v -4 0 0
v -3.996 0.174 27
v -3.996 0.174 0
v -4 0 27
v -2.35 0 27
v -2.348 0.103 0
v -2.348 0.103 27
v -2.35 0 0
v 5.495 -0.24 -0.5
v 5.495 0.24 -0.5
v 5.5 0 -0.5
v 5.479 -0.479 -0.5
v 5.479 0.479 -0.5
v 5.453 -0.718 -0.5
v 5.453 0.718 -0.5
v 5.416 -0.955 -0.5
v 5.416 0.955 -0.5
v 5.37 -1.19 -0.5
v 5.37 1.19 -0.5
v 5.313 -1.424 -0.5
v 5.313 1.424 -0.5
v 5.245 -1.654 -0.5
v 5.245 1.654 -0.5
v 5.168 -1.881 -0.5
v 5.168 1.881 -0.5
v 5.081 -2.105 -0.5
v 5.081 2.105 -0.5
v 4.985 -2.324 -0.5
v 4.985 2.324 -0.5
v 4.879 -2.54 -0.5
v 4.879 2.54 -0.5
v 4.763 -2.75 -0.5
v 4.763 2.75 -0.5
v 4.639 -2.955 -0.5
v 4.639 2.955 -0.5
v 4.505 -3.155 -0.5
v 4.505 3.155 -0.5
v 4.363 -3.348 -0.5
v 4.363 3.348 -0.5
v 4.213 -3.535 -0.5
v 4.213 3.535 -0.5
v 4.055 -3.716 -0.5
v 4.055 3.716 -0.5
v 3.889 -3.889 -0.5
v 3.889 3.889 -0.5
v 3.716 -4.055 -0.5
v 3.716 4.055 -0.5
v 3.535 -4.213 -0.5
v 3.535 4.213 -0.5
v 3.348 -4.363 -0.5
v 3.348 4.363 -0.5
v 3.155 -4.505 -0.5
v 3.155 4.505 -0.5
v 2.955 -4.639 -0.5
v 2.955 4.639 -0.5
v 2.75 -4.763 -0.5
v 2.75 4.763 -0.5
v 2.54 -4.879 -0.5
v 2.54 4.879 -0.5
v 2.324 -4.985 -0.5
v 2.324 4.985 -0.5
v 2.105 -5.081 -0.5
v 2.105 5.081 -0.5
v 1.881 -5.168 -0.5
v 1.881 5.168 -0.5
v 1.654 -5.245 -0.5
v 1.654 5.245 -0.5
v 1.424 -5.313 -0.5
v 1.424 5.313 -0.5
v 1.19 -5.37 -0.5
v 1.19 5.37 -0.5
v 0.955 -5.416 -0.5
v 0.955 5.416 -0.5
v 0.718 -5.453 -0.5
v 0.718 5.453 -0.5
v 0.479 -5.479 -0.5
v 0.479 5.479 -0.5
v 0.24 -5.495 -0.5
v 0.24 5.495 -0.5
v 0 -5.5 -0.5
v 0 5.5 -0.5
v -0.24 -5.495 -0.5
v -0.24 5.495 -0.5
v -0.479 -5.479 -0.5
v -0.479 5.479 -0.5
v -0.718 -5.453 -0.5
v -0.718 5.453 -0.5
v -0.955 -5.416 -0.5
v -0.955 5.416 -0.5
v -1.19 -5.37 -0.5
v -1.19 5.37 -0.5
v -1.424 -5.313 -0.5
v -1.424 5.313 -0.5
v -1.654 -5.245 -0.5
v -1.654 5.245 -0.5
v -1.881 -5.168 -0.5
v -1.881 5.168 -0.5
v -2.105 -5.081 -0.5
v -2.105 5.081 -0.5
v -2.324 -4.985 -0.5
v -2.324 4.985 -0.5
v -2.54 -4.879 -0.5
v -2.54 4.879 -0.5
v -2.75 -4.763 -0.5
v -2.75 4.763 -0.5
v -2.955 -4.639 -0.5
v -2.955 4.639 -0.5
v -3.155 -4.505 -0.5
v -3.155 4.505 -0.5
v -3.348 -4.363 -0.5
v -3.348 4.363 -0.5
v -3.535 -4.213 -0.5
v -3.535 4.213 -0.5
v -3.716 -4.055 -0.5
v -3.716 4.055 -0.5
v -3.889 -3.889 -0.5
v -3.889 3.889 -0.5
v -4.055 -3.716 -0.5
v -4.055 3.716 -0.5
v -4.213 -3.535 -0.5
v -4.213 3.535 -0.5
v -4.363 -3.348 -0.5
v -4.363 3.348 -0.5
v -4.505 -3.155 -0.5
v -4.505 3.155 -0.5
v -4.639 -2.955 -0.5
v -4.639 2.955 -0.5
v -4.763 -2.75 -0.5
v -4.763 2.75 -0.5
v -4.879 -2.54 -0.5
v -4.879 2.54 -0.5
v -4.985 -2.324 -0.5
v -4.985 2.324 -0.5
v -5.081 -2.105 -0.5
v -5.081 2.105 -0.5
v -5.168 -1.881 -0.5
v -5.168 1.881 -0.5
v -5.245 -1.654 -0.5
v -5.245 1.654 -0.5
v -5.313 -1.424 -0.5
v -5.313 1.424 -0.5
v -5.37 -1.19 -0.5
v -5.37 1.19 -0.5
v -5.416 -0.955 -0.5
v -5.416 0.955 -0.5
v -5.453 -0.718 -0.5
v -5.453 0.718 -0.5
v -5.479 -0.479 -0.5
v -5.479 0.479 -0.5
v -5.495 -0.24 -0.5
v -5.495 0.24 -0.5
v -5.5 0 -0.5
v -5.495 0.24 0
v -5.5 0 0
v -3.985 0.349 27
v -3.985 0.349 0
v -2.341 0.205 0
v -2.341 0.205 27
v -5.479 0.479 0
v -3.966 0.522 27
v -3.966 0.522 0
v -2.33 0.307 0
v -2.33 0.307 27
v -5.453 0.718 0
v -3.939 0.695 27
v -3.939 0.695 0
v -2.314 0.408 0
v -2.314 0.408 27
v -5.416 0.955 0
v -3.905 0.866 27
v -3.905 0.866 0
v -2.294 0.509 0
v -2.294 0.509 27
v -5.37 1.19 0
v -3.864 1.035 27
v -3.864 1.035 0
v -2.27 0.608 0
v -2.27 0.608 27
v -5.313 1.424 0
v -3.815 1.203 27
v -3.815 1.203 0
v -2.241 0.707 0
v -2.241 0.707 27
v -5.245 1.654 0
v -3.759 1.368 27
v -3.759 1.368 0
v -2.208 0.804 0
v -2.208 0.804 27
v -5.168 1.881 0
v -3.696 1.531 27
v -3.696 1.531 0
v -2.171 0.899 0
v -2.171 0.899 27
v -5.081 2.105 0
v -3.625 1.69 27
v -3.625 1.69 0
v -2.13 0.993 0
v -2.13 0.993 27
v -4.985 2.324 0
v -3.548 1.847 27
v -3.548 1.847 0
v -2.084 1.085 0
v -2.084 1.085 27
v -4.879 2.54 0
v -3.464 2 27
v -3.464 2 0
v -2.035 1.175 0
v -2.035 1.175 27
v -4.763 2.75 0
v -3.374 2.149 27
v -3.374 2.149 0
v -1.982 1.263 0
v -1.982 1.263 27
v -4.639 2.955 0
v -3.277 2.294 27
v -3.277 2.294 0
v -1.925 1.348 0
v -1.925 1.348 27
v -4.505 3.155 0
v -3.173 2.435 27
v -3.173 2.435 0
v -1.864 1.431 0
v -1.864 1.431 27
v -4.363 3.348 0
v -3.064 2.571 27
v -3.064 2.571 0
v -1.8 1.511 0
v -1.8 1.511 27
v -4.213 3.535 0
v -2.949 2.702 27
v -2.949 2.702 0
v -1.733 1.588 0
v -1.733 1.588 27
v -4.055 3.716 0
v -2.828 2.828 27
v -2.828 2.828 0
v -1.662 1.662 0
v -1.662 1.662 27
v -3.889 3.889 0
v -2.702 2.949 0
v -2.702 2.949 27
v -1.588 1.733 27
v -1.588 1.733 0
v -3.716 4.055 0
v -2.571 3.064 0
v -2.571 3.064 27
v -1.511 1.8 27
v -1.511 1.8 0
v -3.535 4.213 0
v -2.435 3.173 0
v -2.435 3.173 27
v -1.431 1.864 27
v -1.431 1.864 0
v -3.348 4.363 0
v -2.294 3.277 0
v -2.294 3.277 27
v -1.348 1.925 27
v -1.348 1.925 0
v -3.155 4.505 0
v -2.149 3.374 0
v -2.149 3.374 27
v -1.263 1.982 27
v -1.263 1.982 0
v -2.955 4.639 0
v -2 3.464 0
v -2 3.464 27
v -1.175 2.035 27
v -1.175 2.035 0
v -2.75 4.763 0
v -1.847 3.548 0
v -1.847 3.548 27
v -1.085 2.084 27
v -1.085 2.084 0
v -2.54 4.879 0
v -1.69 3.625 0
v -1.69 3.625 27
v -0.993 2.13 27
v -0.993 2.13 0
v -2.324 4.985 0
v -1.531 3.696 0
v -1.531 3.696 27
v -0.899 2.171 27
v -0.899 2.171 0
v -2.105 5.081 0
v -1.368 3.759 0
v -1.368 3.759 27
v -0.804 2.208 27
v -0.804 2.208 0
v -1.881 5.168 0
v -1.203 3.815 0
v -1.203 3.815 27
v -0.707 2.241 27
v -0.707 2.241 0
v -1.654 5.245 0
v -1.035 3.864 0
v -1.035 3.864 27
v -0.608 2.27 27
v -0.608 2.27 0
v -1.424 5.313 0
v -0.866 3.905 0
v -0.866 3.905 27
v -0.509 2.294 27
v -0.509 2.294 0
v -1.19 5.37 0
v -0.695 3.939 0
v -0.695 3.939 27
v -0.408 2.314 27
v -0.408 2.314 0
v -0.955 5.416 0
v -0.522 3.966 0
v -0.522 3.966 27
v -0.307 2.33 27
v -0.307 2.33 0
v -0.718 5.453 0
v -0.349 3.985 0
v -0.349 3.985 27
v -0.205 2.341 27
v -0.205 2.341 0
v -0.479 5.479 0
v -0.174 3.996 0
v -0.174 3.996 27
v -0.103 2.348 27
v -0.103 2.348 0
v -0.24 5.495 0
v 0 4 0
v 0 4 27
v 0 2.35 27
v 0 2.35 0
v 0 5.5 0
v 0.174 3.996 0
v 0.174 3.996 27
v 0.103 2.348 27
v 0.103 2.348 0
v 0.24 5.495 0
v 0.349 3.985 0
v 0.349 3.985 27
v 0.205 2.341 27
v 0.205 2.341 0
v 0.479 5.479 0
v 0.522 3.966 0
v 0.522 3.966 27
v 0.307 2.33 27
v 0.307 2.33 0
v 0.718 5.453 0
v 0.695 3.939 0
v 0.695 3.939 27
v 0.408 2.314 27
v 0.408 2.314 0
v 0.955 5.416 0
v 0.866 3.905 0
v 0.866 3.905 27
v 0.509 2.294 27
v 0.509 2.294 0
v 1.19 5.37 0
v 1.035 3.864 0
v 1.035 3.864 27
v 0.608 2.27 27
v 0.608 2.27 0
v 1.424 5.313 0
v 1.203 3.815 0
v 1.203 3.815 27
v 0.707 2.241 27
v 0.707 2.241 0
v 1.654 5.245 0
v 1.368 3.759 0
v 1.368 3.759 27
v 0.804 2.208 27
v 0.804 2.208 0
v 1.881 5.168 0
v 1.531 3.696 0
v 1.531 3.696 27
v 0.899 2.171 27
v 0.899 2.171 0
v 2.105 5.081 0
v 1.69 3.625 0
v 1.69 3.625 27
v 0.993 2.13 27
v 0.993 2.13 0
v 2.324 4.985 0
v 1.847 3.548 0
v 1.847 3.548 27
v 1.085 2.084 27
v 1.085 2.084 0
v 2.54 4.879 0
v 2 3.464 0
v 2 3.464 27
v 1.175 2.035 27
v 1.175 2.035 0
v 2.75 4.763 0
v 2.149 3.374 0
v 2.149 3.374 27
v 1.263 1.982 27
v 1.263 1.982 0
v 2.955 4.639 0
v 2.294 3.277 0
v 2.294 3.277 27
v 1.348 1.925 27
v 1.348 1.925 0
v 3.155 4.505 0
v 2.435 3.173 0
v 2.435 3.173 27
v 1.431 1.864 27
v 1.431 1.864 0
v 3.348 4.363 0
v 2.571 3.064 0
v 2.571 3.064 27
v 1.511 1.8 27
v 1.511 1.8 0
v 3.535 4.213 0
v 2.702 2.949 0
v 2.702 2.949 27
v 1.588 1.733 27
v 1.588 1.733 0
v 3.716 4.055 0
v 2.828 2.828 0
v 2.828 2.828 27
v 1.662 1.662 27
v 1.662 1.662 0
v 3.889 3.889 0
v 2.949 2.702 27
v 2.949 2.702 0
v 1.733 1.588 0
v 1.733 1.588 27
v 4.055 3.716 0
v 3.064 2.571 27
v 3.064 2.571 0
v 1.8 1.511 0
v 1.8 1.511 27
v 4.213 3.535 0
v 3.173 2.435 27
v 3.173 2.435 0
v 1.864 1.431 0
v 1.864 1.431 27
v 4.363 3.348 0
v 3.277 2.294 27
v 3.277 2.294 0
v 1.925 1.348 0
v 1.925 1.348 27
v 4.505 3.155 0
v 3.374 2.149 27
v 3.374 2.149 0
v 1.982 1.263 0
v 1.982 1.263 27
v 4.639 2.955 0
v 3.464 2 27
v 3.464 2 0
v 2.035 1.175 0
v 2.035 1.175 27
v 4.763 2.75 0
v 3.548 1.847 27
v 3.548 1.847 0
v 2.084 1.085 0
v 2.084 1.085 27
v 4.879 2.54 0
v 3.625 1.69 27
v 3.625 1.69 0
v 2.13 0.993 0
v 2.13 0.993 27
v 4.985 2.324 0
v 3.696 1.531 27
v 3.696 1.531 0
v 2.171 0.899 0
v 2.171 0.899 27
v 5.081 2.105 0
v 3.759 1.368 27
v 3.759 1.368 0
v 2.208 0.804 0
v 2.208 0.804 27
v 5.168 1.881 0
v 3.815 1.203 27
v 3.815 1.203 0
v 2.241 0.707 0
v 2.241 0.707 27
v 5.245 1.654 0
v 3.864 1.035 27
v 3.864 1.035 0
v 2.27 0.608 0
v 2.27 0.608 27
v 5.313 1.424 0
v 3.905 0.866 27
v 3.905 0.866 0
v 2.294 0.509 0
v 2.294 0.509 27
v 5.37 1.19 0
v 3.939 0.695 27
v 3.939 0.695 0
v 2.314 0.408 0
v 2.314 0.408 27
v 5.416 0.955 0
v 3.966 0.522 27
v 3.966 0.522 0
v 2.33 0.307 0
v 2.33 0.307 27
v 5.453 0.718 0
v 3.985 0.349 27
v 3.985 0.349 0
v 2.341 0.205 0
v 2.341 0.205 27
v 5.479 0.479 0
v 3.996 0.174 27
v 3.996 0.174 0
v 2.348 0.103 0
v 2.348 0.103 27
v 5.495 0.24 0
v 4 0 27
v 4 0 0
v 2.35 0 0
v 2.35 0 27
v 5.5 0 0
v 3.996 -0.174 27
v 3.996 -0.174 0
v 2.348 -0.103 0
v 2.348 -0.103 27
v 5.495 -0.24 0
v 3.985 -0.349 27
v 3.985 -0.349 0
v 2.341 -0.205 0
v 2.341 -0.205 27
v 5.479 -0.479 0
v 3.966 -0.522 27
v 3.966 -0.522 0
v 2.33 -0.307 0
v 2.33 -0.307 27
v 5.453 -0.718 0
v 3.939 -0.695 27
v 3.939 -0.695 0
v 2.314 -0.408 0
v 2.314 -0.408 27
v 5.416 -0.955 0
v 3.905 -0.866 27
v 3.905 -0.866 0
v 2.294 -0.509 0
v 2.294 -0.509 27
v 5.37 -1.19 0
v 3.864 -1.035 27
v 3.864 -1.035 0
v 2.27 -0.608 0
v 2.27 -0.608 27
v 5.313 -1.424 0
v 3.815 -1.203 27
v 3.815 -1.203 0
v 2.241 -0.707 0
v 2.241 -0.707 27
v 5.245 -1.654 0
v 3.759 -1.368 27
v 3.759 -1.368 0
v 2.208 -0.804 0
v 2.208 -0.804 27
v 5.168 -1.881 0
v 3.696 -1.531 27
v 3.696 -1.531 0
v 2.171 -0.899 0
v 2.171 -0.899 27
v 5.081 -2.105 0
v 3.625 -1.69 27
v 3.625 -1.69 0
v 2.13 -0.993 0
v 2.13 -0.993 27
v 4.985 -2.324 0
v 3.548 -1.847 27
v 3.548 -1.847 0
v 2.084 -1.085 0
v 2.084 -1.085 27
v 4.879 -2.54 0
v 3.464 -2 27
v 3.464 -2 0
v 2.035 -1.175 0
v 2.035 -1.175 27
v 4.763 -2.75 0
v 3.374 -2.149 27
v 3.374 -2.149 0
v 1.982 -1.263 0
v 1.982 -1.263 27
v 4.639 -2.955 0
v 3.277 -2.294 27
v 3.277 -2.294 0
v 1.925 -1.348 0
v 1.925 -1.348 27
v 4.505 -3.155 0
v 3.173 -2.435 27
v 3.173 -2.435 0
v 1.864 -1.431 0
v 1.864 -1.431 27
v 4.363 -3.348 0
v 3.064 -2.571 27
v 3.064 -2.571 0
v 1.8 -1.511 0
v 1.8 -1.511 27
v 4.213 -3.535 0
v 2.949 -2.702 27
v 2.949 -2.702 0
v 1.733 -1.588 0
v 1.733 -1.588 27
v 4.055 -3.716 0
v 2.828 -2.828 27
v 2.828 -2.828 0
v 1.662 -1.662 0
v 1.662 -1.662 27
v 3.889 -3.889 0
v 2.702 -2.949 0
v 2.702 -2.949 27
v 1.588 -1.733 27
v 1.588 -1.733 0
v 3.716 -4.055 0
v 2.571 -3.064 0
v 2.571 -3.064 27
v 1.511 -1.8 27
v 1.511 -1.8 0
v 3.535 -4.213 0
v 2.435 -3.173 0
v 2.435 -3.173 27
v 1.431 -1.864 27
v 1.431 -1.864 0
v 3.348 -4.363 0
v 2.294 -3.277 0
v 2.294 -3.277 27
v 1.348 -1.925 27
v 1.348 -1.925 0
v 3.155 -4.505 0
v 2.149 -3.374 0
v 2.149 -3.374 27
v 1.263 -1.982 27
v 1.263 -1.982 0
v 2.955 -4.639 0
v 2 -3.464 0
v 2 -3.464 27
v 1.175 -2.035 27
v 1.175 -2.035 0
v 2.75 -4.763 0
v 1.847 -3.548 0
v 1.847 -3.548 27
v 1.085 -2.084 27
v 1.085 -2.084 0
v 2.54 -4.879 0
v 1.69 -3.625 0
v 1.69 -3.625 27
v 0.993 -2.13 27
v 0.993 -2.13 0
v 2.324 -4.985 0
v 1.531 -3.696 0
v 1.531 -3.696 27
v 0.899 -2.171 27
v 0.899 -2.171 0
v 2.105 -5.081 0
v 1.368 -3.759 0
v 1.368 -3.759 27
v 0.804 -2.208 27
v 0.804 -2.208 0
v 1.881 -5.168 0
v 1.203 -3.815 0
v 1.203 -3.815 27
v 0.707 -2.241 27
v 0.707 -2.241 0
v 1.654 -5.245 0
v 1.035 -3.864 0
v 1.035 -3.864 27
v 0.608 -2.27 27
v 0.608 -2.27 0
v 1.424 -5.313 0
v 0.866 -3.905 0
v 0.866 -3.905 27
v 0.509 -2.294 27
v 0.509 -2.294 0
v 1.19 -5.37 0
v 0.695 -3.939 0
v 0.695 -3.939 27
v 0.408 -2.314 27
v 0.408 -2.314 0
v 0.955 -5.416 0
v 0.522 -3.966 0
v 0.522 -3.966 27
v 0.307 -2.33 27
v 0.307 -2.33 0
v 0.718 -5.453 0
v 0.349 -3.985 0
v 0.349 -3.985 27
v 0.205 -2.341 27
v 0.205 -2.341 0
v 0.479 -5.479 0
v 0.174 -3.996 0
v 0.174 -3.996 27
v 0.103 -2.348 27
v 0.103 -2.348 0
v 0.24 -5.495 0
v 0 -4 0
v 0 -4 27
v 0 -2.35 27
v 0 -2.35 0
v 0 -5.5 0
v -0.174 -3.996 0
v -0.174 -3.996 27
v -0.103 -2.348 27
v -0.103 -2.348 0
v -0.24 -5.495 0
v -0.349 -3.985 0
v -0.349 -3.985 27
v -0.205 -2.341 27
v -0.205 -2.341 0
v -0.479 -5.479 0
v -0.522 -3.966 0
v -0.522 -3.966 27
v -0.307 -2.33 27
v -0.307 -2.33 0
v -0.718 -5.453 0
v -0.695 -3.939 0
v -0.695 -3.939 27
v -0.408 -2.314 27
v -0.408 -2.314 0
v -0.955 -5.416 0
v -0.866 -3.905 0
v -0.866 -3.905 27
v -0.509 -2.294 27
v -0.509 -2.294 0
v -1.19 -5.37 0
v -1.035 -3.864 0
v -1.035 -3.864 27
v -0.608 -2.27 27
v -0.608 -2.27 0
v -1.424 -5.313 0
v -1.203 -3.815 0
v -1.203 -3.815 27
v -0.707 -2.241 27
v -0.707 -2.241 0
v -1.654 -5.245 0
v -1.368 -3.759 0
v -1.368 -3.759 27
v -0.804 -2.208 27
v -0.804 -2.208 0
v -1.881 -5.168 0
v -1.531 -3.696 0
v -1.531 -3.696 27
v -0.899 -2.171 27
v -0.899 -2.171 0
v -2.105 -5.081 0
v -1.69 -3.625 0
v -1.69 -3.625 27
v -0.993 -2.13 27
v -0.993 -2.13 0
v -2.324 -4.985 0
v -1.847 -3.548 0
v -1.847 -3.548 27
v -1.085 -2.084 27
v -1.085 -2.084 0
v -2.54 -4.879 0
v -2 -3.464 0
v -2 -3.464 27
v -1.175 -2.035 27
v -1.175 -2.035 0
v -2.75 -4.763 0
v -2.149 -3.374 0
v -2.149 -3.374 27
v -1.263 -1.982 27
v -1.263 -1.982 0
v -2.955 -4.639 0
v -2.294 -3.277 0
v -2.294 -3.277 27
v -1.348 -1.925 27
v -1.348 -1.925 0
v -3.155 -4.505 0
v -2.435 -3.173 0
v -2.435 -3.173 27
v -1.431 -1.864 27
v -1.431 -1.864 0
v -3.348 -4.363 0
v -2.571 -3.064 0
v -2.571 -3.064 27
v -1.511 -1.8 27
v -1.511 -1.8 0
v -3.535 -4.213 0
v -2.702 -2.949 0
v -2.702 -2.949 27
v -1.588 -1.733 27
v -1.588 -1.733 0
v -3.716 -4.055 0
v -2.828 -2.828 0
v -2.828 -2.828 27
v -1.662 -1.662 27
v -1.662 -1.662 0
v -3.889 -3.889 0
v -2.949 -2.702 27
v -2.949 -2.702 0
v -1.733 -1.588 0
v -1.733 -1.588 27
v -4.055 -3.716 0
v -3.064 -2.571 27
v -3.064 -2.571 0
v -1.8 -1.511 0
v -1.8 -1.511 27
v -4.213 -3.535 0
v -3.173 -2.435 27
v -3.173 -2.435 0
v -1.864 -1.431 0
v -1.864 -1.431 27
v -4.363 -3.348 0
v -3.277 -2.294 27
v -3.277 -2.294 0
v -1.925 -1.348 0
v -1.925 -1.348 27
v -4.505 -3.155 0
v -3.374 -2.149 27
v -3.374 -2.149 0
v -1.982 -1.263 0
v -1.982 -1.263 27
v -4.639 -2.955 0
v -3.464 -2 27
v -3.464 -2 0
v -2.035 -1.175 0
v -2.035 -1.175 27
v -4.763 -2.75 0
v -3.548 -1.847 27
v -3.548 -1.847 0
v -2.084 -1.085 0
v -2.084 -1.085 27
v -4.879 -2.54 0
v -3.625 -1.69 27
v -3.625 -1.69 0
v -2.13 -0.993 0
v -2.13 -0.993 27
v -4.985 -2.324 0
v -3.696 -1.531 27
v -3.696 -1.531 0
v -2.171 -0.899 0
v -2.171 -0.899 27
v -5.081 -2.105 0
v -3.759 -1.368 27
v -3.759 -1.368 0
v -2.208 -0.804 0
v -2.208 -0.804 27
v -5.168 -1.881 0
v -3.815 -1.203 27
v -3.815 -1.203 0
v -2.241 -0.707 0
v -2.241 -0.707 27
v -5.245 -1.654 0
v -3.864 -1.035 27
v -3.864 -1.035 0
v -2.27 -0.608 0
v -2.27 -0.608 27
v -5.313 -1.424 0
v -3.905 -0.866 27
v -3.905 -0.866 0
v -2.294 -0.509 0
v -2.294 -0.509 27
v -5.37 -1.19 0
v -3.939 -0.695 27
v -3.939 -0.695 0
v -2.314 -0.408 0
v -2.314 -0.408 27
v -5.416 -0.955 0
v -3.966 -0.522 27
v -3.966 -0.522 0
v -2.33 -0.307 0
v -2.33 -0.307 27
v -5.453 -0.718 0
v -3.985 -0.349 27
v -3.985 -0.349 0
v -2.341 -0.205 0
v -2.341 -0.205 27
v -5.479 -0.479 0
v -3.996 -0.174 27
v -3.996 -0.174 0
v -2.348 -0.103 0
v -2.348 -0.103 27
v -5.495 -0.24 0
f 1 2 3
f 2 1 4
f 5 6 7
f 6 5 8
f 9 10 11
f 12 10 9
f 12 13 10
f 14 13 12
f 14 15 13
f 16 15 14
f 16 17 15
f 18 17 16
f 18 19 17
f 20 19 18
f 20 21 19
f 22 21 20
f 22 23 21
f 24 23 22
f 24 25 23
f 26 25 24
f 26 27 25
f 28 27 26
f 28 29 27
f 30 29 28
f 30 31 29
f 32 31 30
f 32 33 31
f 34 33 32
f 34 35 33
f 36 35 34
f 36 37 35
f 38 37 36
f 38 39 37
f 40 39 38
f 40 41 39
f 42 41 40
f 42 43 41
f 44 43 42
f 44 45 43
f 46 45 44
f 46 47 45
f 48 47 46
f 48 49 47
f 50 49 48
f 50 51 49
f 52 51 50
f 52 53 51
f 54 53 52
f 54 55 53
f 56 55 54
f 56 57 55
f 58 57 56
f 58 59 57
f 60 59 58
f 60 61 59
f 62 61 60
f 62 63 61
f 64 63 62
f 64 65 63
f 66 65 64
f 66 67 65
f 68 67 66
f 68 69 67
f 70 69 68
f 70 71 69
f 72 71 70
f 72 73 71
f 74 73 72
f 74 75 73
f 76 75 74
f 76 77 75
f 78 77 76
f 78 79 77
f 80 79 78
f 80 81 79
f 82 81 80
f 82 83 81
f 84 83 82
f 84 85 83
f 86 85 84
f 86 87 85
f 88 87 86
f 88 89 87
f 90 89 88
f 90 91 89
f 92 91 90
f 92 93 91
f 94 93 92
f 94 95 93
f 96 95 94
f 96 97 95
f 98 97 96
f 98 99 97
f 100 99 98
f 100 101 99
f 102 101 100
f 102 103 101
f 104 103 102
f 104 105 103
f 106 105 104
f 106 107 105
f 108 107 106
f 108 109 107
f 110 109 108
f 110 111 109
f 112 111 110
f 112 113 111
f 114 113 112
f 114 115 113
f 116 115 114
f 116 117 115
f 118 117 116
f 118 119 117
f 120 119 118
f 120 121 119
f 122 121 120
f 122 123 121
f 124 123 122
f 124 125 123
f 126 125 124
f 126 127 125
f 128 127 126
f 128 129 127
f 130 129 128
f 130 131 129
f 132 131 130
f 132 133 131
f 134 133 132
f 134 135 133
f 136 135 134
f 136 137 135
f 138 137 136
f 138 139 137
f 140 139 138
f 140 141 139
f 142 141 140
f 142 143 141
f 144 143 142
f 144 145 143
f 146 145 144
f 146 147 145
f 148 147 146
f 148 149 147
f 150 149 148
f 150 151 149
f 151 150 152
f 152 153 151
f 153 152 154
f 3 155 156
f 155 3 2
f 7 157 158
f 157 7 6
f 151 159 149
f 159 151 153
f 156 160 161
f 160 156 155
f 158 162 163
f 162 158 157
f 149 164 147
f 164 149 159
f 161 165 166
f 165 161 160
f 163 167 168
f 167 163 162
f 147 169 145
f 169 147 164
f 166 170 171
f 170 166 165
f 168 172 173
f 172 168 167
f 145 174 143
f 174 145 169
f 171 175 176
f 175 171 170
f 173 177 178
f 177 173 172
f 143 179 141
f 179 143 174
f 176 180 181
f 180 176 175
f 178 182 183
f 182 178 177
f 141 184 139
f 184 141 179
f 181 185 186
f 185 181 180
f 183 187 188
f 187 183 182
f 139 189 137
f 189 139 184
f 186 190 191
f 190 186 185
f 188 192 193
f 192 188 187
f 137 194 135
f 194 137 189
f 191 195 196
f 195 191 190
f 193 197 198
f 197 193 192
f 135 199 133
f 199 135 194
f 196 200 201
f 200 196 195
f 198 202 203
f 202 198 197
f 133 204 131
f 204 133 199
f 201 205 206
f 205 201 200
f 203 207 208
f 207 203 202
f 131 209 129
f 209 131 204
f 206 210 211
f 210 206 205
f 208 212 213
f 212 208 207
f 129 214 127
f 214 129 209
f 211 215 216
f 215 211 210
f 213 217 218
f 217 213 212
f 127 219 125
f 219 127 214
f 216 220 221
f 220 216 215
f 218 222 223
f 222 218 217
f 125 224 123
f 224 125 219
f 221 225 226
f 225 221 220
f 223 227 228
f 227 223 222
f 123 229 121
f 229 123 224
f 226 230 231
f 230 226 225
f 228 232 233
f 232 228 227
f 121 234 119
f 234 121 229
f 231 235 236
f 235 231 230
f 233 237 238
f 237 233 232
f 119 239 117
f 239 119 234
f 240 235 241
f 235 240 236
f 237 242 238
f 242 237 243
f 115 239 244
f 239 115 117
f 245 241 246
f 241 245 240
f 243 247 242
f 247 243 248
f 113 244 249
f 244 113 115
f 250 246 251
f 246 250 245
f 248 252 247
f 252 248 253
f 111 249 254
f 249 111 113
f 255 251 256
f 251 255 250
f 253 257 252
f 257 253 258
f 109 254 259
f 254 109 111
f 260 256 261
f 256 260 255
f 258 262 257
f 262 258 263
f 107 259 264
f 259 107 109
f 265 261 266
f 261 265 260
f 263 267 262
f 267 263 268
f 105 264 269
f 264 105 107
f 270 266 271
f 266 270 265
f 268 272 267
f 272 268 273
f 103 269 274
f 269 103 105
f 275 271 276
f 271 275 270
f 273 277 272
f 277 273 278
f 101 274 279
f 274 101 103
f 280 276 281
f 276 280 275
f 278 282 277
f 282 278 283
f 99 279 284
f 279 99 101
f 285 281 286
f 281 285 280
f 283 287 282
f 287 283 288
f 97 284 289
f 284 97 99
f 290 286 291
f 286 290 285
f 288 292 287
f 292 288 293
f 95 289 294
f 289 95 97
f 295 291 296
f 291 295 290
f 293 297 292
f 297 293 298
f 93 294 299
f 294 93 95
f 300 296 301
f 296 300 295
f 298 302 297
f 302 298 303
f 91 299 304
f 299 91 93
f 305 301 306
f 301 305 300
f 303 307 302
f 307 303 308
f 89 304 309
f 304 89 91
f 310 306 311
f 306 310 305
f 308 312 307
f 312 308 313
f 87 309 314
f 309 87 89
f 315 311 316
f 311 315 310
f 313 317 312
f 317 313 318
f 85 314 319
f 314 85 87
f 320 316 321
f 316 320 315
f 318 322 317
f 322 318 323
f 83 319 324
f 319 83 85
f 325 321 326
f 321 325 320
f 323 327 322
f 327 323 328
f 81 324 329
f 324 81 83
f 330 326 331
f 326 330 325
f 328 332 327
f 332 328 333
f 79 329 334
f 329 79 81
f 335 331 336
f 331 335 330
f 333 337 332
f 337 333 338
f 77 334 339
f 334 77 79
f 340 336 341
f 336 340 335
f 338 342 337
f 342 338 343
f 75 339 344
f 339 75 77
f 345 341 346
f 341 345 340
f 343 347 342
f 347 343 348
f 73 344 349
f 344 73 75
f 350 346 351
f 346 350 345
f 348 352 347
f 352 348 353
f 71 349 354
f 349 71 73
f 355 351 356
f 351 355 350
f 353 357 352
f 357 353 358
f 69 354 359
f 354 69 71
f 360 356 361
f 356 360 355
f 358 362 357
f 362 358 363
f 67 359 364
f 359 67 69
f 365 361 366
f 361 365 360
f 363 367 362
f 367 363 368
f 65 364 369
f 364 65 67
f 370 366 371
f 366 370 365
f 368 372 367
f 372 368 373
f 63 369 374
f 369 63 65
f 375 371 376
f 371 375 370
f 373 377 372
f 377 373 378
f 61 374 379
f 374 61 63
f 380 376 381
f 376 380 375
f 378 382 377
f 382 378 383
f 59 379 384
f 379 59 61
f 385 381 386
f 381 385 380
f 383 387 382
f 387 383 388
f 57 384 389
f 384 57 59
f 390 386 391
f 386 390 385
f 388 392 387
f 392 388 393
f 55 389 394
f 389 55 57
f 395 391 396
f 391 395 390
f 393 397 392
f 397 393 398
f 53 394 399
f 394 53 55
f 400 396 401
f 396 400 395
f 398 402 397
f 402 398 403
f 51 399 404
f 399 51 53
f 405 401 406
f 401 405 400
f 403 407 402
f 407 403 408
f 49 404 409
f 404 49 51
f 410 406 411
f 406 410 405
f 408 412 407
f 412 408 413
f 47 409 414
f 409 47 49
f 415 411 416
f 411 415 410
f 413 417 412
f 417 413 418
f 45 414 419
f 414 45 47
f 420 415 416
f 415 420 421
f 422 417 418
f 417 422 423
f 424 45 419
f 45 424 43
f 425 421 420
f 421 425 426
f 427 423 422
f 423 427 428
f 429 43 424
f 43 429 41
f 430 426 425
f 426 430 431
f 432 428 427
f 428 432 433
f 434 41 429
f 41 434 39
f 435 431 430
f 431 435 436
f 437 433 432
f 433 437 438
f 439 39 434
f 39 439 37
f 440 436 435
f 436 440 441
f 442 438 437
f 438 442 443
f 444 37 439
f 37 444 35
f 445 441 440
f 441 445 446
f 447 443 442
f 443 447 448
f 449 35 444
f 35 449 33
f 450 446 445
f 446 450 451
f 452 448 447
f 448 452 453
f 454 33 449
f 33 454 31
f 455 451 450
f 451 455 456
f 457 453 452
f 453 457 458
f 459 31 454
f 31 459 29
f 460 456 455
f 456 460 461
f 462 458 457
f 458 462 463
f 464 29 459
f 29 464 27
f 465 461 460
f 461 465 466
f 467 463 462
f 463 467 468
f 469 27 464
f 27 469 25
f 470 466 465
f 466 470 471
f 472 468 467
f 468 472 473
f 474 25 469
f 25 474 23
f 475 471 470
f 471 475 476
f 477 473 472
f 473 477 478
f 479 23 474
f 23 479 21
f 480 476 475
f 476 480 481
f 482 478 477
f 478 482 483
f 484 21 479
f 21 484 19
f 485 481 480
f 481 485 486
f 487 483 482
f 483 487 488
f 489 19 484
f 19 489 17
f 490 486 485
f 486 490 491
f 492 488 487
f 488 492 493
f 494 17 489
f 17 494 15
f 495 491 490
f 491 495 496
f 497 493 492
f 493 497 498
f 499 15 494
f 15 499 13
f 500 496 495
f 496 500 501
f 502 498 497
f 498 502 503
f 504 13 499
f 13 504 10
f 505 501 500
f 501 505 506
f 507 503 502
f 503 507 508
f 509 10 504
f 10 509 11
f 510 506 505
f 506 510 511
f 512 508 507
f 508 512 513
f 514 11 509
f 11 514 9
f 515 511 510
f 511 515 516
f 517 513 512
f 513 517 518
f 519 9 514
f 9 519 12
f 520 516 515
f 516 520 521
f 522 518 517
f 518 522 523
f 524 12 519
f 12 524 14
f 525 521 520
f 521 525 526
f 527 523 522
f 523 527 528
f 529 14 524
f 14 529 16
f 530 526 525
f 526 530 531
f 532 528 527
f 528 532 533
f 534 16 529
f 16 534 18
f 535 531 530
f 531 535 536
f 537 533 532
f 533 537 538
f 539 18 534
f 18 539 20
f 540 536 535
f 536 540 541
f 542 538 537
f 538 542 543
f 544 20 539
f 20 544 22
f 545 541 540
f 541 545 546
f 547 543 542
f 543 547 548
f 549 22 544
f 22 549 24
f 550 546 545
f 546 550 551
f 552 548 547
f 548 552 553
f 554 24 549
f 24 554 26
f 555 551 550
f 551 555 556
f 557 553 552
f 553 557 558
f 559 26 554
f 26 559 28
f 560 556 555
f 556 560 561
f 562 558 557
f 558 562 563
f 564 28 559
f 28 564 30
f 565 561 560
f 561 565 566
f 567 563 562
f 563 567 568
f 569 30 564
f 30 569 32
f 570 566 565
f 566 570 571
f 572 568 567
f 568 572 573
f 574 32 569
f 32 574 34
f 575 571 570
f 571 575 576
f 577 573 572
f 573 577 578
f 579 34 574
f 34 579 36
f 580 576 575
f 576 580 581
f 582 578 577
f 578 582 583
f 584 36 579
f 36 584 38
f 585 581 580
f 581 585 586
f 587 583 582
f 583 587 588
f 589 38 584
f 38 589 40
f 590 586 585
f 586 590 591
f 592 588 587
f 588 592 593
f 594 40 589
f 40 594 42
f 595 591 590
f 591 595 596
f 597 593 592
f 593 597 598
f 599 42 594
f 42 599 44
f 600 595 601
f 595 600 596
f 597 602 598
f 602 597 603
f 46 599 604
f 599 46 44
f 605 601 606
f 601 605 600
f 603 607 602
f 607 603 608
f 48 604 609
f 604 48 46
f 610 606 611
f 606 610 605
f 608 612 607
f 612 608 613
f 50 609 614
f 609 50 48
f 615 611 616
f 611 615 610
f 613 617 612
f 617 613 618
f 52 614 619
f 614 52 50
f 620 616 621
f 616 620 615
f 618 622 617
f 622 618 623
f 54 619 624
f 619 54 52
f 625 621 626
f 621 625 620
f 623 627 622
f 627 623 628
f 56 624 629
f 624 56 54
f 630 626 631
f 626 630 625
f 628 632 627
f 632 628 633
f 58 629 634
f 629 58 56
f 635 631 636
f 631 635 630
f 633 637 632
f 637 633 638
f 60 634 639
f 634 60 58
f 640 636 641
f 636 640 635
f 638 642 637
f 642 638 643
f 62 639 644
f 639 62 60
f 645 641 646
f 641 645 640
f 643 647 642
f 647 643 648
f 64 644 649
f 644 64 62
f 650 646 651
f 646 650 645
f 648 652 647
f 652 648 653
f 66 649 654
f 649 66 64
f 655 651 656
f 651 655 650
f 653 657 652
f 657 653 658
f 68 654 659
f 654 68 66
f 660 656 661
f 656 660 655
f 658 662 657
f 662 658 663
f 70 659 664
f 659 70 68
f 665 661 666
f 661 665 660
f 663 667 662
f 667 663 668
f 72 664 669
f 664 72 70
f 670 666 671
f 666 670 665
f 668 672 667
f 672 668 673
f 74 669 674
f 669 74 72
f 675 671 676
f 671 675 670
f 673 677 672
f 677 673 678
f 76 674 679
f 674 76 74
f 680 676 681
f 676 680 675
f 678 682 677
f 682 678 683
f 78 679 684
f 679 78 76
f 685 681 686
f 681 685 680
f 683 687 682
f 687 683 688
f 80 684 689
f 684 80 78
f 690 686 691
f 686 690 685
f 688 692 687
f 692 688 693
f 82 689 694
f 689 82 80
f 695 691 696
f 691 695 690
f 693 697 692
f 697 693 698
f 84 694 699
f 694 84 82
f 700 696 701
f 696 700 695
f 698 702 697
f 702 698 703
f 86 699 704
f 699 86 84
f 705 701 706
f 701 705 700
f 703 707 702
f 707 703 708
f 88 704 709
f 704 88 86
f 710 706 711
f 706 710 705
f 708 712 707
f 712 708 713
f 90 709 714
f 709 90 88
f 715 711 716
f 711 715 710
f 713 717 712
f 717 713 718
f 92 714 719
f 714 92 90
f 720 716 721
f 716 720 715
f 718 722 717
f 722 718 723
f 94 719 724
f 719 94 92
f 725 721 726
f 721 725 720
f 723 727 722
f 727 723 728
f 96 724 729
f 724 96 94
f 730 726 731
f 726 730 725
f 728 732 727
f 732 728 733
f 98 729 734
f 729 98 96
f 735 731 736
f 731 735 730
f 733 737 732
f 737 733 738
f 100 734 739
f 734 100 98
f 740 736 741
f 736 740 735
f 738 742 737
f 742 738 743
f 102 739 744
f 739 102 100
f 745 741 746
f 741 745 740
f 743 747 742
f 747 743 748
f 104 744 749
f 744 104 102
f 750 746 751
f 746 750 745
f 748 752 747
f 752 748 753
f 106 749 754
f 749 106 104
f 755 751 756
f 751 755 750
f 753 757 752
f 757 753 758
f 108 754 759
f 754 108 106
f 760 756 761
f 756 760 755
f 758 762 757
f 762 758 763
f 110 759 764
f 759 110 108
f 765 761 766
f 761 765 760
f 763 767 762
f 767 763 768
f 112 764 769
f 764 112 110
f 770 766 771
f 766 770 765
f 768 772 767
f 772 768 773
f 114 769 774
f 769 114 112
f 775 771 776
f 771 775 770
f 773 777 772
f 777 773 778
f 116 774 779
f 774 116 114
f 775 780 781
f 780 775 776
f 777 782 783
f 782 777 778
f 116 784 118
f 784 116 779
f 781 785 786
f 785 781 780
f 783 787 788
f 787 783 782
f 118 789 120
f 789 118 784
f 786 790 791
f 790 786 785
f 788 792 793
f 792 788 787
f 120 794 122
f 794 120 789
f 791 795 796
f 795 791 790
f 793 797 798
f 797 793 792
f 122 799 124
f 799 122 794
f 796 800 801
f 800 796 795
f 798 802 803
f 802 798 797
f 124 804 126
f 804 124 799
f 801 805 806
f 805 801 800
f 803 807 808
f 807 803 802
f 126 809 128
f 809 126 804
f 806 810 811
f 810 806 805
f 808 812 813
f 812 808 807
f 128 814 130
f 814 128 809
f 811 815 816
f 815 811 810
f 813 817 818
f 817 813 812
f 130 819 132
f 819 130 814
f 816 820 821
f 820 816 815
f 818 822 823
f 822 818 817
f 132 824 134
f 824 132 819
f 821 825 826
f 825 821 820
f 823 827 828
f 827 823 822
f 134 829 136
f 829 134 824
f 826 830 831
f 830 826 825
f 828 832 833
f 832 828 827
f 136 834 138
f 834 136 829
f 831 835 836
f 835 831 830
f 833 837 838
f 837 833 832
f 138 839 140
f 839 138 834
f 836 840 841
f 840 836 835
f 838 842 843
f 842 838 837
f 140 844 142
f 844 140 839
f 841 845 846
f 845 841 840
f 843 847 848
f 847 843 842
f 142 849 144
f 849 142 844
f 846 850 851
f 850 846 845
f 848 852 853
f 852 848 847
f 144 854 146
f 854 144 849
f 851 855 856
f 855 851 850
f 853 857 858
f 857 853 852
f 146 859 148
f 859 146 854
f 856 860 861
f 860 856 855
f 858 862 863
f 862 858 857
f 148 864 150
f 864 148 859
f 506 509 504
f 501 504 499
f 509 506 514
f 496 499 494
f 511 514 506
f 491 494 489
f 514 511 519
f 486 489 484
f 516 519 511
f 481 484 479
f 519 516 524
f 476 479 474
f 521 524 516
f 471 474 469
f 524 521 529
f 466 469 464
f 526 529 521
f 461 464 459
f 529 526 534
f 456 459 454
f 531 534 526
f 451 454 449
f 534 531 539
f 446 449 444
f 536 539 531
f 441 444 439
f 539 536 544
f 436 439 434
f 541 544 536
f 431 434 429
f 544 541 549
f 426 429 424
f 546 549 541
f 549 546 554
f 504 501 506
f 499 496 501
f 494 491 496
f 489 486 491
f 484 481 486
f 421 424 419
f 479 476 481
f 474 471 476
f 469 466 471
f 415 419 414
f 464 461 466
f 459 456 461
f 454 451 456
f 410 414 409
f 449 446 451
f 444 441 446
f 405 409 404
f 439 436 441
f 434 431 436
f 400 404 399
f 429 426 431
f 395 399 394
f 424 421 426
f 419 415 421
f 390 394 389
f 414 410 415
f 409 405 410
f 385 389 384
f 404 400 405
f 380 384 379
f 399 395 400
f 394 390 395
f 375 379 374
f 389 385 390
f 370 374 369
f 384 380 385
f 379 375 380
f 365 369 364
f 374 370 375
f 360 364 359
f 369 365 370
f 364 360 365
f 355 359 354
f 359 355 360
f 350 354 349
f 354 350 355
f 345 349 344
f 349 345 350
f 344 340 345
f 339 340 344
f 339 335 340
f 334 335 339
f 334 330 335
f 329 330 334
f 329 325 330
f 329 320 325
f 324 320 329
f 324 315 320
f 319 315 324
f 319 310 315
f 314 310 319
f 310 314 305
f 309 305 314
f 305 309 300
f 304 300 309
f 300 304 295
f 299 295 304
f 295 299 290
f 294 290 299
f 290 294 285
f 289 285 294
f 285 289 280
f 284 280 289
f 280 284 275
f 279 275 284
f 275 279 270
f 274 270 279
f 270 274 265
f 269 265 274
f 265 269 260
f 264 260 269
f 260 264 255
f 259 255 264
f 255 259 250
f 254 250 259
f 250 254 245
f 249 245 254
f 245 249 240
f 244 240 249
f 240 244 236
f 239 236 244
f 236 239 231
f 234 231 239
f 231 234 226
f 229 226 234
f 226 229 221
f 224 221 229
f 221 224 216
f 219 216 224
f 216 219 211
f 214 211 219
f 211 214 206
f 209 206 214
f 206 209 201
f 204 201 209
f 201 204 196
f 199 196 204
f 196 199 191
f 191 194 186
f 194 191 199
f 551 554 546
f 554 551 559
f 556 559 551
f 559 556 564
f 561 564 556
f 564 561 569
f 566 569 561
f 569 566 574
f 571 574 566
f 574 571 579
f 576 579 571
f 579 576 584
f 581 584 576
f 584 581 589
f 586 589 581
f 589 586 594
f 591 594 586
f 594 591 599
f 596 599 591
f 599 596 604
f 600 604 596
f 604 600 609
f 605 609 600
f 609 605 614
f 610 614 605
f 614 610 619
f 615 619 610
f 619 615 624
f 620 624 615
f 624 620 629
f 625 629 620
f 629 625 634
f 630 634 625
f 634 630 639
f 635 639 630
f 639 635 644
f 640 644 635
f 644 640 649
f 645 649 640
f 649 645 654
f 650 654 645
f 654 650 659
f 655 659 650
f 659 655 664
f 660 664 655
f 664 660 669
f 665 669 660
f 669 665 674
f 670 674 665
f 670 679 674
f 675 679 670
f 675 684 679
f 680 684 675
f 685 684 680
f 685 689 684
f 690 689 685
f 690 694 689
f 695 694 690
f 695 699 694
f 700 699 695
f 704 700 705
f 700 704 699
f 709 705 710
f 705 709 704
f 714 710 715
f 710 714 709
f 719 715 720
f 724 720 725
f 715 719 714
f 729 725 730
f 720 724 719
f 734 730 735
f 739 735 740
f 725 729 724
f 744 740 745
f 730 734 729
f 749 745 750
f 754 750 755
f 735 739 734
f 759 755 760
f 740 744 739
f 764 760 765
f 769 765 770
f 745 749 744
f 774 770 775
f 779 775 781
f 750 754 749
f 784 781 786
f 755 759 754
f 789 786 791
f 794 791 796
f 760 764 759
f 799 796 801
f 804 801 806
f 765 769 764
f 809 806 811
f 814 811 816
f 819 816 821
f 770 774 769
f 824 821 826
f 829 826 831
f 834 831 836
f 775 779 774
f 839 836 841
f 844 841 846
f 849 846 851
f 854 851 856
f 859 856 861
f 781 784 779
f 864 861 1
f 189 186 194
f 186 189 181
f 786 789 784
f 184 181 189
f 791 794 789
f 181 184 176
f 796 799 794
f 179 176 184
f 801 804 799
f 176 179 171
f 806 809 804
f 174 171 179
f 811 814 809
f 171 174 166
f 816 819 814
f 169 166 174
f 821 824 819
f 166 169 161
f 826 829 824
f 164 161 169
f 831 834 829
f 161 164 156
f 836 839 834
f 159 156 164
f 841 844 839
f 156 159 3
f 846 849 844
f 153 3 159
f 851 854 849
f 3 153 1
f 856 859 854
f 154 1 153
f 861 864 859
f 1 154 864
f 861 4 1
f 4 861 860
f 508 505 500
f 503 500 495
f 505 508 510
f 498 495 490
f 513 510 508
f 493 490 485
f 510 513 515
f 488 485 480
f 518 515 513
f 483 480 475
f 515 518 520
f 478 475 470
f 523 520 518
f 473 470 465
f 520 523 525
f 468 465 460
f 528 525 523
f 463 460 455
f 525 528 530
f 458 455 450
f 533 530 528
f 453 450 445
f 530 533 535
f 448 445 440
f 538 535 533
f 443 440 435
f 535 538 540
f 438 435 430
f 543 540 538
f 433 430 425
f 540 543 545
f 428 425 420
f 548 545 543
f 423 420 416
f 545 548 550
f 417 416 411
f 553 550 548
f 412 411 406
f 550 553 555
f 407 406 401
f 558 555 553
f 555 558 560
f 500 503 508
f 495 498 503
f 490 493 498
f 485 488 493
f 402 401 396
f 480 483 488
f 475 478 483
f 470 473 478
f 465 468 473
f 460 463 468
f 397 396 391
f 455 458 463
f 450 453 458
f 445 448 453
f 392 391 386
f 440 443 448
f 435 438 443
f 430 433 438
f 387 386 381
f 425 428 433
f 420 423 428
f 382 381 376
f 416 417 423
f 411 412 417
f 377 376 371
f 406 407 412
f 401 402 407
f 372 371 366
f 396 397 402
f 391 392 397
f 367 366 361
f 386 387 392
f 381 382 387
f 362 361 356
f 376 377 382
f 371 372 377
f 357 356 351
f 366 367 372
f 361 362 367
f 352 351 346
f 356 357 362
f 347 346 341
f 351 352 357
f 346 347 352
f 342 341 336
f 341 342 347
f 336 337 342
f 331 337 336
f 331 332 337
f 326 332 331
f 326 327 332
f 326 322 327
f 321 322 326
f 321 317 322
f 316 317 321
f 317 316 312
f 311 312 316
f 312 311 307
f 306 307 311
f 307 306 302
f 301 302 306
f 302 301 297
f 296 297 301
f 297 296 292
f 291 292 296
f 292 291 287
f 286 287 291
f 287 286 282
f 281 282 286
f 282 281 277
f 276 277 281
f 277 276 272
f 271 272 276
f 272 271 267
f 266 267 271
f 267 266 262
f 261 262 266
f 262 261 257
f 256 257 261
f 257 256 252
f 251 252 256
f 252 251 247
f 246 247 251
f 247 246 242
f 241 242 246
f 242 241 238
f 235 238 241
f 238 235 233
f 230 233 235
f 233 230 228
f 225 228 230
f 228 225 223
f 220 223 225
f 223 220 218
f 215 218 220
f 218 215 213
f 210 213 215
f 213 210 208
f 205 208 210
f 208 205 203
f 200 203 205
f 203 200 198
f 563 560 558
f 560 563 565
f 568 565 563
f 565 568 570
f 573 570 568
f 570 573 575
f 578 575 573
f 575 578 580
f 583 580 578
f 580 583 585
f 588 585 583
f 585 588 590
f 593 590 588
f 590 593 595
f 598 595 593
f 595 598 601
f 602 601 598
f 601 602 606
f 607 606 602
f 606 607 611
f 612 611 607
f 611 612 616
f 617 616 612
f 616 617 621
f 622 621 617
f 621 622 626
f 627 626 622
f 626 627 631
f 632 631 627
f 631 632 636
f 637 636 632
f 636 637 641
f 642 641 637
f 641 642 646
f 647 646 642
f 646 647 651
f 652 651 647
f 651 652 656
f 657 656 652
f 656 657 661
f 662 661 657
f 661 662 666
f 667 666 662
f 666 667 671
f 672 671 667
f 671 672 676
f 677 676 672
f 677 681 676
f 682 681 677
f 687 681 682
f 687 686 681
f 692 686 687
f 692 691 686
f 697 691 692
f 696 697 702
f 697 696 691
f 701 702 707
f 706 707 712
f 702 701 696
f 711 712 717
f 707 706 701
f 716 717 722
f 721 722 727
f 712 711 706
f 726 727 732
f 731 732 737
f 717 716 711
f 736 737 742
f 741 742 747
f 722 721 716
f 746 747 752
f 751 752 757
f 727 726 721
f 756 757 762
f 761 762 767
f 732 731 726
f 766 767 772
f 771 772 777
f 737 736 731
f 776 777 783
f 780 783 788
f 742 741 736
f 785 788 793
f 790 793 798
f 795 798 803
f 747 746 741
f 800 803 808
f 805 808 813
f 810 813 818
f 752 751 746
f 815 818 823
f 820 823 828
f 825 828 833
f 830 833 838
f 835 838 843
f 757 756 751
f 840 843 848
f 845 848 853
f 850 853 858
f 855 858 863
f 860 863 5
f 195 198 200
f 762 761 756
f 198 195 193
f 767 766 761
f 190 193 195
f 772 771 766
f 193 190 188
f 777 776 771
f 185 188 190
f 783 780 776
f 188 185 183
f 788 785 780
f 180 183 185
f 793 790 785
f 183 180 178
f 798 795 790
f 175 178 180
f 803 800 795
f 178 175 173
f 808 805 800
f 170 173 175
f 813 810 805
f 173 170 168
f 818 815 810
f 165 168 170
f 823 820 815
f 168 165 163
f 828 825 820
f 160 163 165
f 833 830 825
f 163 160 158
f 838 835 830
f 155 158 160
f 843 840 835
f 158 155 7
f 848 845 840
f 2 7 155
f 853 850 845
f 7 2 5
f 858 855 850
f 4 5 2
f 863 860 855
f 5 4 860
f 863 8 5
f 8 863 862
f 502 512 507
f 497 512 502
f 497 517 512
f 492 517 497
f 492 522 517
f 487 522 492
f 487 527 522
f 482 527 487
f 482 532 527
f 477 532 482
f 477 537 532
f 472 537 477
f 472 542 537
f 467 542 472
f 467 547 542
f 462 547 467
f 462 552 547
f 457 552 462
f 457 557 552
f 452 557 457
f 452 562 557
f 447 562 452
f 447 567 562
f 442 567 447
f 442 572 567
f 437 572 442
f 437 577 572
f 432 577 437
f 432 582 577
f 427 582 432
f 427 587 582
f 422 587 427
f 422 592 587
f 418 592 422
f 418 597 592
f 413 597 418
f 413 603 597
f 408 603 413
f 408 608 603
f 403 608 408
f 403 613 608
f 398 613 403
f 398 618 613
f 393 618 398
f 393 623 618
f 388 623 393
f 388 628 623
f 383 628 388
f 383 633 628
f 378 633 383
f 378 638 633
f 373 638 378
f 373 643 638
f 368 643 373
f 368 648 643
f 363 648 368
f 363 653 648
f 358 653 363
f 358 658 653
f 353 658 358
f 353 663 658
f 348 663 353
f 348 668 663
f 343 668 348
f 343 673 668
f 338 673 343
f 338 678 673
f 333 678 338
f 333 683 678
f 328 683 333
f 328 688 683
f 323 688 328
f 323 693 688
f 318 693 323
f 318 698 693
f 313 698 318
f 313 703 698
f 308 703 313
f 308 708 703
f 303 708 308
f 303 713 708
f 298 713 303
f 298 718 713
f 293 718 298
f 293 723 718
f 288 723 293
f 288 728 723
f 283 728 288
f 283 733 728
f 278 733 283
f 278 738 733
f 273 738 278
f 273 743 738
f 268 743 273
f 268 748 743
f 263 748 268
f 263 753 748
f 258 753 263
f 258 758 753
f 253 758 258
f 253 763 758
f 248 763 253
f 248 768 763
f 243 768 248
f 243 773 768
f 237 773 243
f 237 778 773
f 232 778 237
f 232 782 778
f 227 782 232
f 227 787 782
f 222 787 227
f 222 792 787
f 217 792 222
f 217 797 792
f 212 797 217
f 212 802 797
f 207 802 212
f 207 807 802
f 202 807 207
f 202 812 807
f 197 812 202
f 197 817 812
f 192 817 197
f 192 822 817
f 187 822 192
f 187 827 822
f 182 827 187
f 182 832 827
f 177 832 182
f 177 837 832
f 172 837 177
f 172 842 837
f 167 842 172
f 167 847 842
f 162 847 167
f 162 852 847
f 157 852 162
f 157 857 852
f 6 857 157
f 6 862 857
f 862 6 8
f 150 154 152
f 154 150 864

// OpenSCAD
// file: ../print_fit.scad
// Print-fit clearances, shared by every printed part's `config="revised"`.
//
// A printed part comes off the machine slightly oversize, so a feature drawn
// line-to-line against what it mates with will not go together. Each mating
// feature is drawn at its mate's nominal size plus or minus one of two
// clearances, per side, chosen by what the mate is:
//
//     FIT_PRESS    a bought part the printed one is seated on, located by
//                  or bonded to: bearings, motors, splines, CF rods, tubes
//                  and strakes
//     FIT_SLIP     another printed part, and every fastener's clearance:
//                  screw holes, nut traps and pockets
//
// A third class is not a fit, because its surfaces never meet:
//
//     FIT_RUN      a gap between two parts that turn past each other and
//                  must never touch, such as a housing and a gear's teeth
//
// A fourth class is drawn under its mate's size, not over it:
//
//     FIT_TAP      a pilot a screw cuts its own thread into, drawn as
//                  fit_pin(the screw's nominal, FIT_TAP)
//
// The classes, their members and exclusions, and how a machine is qualified
// against these values are owned by specs/007.2 § Print fits; the coupon that
// qualifies them is 950-Tooling/fit_coupon.scad.
//
// Every part `include`s this file, so `-D FIT_SLIP=...` reaches a single
// render, and an edit here retunes every part. `config="previous"` draws at
// zero clearance: it is the reference mesh, and its dist gate measures it.

FIT_SLIP  = 0.15;
FIT_PRESS = 0.05;
FIT_RUN   = 0.50;
FIT_TAP   = 0.20;

// A hole or bore that takes a mate of diameter d, and a pin or shaft that
// goes into one, with clearance c per side.
function fit_bore(d, c) = d + 2 * c;
function fit_pin(d, c) = d - 2 * c;

// The clearances a part draws in configuration cfg: [slip, press, run, tap].
function fit_clearances(cfg) =
    cfg == "previous" ? [0, 0, 0, 0] : [FIT_SLIP, FIT_PRESS, FIT_RUN, FIT_TAP];
// file: belt_director.scad
// The Belt Director: a shouldered sleeve, shared by the two lengths of it, and the cap that presses in
// behind it.
//
//     210-004_SmallBeltDirector.scad   S1 17.000 long, revised 16.700
//     210-005_LargeBeltDirector.scad   S1 27.000 long, revised 26.000
//     210-001_BeltDirectorCap.scad     the cap, for either
//
// Two MR128s press onto S1, whose Ø8.000 is their bore, so their Ø12 outer races carry the belt; the
// directors push through the Arm Body's lug columns front to back and a cap presses in behind
// (specs/008.5 step 7). Measured from both references with scadmesh profile/slice/radial; they agree
// to 0.002, and their only difference is S1's length. The feature IDs are those of each part's
// .view.json:
//
//     ID  feature   value                       z span
//     H1  head      Ø11.000, solid              -0.500 .. 0
//     S1  shank     Ø8.000                      0 .. length
//     B1  core      Ø4.700, blind to H1         0 .. length
//
// The z rows a histogram reports along S1 (5.667, 11.333 on the Small; 5.4, 6.75, ... on the Large)
// are tessellation rows, not faces. FRAME: the axis on +Z through the origin, H1's top at z = 0.
//
// THE DISCS. The head bears on the bearing at the front and the cap's disc on the one at the back, and a
// disc that reaches the outer race brakes the bearing it locates, since the outer race is the one that
// turns with the belt. `revised` therefore draws both discs at DISC_D, one diameter, between S1's Ø8 and
// the Ø10 halfway line across the MR128's section (700-Differential/diff_params.scad, shoulder_bore), so
// each touches the inner race alone and clears the outer race, DISC_T thick for strength, with the outer
// face's edge rounded DISC_FILLET to be comfortable to handle. The bearing-side edge stays sharp: a round
// there would take the flat the inner race bears on. `previous` keeps the reference head's Ø11 x 0.5.
//
// THE CAP. A solid plug of the core's bore at the press clearance (print_fit.scad), CAP_PLUG long, under a
// disc of the head's size. FRAME: the disc's underside at z = 0, the plug below it. The cap's disc sits on
// the inner race of the bearing behind the shank: `revised` S1 is the span between a column's outer bearings
// (the Arm Body draws B and C 16.7 apart, A 26.0), so it ends flush with the bearing behind it and the disc bears
// on the race and the shank both. S1's `previous` length is the reference's.
//
// FITS (print_fit.scad), revised only: S1 on the MR128's Ø8 bore at the press clearance, and the cap's plug
// in B1 at the press clearance too: both are printed, which is the slip class, but the plug is a press fit by
// design, and a slip gap would let it fall out. S1 in the Arm Body's Ø9 holes is settled there.
//
// Used, not included: each part file calls belt_director(length) or belt_director_cap(), and the Idler
// Plug solid_revolve().

include <../print_fit.scad>

BELT_DIRECTOR_HEAD  = [5.500, 0.500];   // previous: radius, thickness
BELT_DIRECTOR_SHANK = 4.000;            // radius
BELT_DIRECTOR_CORE  = 2.350;            // radius
DISC_D              = 9.500;            // revised: both discs
DISC_T              = 2.000;            // revised: both discs' thickness
DISC_FILLET         = 1.000;            // revised: the round on each disc's outer edge
CAP_PLUG            = 5.000;            // the plug's length: past the bearing's 3.5

// The quarter circle of radius r about c, from angle a0 to a1.
function quarter(c, r, a0, a1, n = 12) = [for (i = [0 : n]) c + r * [cos(a0 + (a1 - a0) * i / n), sin(a0 + (a1 - a0) * i / n)]];

// The solid of revolution of an [r, z] profile with an edge on the axis, clipped to a box 1 mm clear of
// it so that the export carries no zero-area facets along the axis (README.md, "A revolve with an edge
// on the axis"). The Idler Plug uses it too.
module solid_revolve(profile)
    let(r = max([for (p = profile) p.x]) + 1, z0 = min([for (p = profile) p.y]) - 1, z1 = max([for (p = profile) p.y]) + 1)
    intersection() {
        rotate_extrude() polygon(profile);
        translate([-r, -r, z0]) cube([2 * r, 2 * r, z1 - z0]);
    }

module belt_director(length, cfg = "previous")
    let(t = cfg == "previous" ? BELT_DIRECTOR_HEAD[1] : DISC_T,
        r = cfg == "previous" ? BELT_DIRECTOR_HEAD[0] : DISC_D / 2,
        s = cfg == "previous" ? BELT_DIRECTOR_SHANK : fit_pin(2 * BELT_DIRECTOR_SHANK, fit_clearances(cfg)[1]) / 2,
        f = cfg == "previous" ? 0 : DISC_FILLET)
    solid_revolve(concat(
        [[0, -t]],
        f > 0 ? quarter([r - f, -t + f], f, -90, 0) : [[r, -t]],
        [[r, 0], [s, 0], [s, length], [BELT_DIRECTOR_CORE, length], [BELT_DIRECTOR_CORE, 0], [0, 0]]));

module belt_director_cap(cfg = "revised")
    let(p = fit_pin(2 * BELT_DIRECTOR_CORE, fit_clearances(cfg)[1]) / 2, r = DISC_D / 2, f = DISC_FILLET)
    solid_revolve(concat(
        [[0, -CAP_PLUG], [p, -CAP_PLUG], [p, 0], [r, 0]],
        quarter([r - f, DISC_T - f], f, 0, 90),
        [[0, DISC_T]]));
// main file
// #210-005 Large Belt Director — parametric source.
// The Large Belt Director: belt_director.scad's shouldered sleeve, with S1 27.000 long (26.000 in `revised`). That file owns
// the measurements, the feature IDs and the deferred fits.
//
//   config = "previous" — a faithful recreation of the reference mesh
//                         (../Reference/meshes/200-ArmBody/), in that mesh's frame.
//   config = "revised"  — the same part with its head drawn as belt_director.scad's disc and its shank at the press clearance.

use <belt_director.scad>

/* [Configuration] */
// Parameter set: previous (reference) or revised
config = "previous"; // [previous, revised]

/* [Hidden] */
$fn = 144;

LENGTH         = 27.000;   // S1, previous
REVISED_LENGTH = 26.000;   // S1, revised: the span between the outer bearings at A

belt_director(config == "previous" ? LENGTH : REVISED_LENGTH, config);
